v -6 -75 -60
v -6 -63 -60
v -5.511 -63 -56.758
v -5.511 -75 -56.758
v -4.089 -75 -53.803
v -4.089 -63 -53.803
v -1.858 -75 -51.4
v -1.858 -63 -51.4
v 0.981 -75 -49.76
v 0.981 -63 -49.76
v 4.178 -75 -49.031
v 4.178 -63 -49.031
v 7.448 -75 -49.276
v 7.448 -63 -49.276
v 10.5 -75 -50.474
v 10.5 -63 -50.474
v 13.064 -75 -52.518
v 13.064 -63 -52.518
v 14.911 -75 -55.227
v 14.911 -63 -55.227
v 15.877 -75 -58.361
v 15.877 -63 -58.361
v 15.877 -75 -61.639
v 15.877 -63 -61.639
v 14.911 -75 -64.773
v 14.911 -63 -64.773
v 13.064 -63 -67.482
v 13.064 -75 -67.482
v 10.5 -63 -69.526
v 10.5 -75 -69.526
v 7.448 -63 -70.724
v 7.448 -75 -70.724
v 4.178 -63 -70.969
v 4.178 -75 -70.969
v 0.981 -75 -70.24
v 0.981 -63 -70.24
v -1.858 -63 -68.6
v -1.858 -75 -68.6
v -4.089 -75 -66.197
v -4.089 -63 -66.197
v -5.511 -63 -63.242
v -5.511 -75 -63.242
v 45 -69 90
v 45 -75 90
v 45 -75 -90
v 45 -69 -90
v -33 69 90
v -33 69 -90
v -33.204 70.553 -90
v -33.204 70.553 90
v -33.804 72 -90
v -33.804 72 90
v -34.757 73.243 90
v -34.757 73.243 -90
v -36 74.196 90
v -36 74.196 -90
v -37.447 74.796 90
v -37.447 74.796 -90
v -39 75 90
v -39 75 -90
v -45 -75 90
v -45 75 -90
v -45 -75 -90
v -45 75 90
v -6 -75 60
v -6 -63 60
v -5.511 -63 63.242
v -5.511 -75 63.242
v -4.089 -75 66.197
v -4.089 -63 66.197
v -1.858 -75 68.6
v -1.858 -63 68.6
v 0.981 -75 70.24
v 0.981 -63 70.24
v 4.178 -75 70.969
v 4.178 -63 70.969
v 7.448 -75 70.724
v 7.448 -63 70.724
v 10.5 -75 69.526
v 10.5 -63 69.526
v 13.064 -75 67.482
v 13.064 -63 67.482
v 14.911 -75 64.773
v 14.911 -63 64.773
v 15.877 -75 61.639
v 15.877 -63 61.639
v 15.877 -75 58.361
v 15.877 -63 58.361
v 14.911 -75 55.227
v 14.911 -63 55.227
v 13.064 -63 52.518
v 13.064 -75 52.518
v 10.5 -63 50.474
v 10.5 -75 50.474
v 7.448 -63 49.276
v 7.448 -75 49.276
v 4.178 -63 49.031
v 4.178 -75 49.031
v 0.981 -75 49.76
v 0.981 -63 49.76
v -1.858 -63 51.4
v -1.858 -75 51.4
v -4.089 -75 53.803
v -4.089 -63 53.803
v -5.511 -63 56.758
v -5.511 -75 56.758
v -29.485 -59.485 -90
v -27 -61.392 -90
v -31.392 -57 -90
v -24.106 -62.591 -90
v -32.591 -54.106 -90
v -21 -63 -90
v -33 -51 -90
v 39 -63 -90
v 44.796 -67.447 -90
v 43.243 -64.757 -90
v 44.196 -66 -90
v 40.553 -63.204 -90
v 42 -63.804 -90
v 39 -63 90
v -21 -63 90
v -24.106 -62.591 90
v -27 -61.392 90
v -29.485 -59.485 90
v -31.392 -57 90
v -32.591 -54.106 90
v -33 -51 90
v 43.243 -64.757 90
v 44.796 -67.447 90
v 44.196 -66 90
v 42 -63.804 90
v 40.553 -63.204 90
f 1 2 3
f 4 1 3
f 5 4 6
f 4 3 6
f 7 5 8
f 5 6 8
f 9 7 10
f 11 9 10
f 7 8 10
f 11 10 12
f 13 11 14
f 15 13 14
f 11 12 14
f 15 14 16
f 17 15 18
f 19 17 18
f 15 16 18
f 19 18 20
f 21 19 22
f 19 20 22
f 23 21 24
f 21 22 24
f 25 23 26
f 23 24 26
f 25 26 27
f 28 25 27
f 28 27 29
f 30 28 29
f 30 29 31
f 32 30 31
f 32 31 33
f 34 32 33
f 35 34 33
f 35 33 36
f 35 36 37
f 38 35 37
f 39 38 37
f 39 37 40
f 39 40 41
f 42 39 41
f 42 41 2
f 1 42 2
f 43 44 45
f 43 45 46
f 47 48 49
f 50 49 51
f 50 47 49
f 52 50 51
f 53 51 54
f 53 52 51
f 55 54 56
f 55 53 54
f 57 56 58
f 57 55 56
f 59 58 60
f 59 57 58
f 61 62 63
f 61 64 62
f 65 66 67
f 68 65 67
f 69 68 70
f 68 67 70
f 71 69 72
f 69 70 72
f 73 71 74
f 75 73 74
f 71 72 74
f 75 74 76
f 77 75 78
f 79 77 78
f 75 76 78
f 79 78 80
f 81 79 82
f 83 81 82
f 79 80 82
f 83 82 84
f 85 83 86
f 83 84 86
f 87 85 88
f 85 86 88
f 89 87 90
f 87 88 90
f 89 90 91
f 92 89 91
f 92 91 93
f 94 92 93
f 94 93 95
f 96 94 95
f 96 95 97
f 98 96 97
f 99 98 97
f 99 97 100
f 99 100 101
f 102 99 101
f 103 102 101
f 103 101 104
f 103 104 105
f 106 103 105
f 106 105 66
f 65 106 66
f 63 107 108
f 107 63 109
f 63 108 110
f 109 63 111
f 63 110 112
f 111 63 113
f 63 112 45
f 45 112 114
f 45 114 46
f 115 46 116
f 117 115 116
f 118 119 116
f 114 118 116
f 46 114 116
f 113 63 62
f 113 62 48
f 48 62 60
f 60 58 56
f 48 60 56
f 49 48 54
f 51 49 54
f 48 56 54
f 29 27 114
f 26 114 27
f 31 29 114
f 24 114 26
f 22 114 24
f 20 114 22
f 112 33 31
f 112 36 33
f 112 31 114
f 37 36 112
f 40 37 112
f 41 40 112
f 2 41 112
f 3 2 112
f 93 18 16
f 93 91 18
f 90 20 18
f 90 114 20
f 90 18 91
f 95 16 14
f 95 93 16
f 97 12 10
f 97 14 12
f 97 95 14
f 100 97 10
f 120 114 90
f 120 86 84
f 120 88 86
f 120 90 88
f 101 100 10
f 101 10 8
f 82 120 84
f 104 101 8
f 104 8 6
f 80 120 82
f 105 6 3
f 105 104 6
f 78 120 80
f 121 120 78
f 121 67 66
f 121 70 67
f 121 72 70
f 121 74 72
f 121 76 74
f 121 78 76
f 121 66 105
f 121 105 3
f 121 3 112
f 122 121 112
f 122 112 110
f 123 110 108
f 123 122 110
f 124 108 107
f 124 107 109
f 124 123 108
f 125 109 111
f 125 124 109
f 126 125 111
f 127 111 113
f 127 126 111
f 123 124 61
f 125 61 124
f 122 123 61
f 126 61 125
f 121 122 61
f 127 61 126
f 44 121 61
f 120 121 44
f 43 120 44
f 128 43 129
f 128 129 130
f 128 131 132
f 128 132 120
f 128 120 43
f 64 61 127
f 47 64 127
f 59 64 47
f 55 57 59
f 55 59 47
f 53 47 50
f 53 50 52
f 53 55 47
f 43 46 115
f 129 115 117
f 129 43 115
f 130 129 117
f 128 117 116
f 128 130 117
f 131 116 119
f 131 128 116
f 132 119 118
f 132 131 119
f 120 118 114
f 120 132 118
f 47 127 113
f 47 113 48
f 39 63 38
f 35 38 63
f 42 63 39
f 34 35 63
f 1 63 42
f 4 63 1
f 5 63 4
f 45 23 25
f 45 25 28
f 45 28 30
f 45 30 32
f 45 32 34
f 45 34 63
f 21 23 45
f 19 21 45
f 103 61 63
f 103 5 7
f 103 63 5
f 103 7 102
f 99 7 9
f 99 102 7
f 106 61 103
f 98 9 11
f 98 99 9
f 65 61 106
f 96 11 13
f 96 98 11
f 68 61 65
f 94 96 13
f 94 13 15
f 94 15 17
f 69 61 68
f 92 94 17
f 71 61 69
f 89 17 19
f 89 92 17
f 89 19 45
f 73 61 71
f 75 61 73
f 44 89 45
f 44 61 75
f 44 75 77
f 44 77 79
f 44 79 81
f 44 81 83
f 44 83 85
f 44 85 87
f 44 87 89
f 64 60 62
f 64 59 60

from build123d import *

# Parameters (mm, degrees)
BOSS_EXTRUDE1_DEPTH = 90
CUT_EXTRUDE1_REACH  = 172.789
SKETCH2_R           = 11


with BuildPart() as part:
    # Sketch1 → Boss-Extrude1 (new, symmetric)
    with BuildSketch(Plane.XY):
        with BuildLine():
            Line((-45, 75), (-45, -75))
            Line((-45, -75), (45, -75))
            Line((45, -75), (45, -69))
            ThreePointArc((45, -69), (43.242640687, -64.757359313), (39, -63))
            Line((39, -63), (-21, -63))
            ThreePointArc((-21, -63), (-29.485281374, -59.485281374), (-33, -51))
            Line((-33, -51), (-33, 69))
            ThreePointArc((-33, 69), (-34.757359313, 73.242640687), (-39, 75))
            Line((-39, 75), (-45, 75))
        make_face()
    extrude(amount=BOSS_EXTRUDE1_DEPTH, both=True)

    # Sketch2 → Cut-Extrude1 (cut, up to next)
    with BuildSketch(Plane(origin=(0, -63, 0), x_dir=(1, 0, 0), z_dir=(0, 1, 0)), mode=Mode.PRIVATE) as cut_extrude1_sk1:
        with Locations(Location((5, -60, 0), (0, 0, 180))):
            Circle(SKETCH2_R)
    cut_extrude1_tool1 = extrude(cut_extrude1_sk1.sketch, amount=-CUT_EXTRUDE1_REACH, mode=Mode.PRIVATE) & part.part
    # Sketch2 → Cut-Extrude1 (cut, up to next)
    with BuildSketch(Plane(origin=(0, -63, 0), x_dir=(1, 0, 0), z_dir=(0, 1, 0)), mode=Mode.PRIVATE) as cut_extrude1_sk2:
        with Locations(Location((5, 60, 0), (0, 0, 180))):
            Circle(SKETCH2_R)
    cut_extrude1_tool2 = extrude(cut_extrude1_sk2.sketch, amount=-CUT_EXTRUDE1_REACH, mode=Mode.PRIVATE) & part.part
    add(cut_extrude1_tool1.solids().sort_by_distance((5, -63, 60))[0], mode=Mode.SUBTRACT)
    add(cut_extrude1_tool2.solids().sort_by_distance((5, -63, -60))[0], mode=Mode.SUBTRACT)


solid = part.part
